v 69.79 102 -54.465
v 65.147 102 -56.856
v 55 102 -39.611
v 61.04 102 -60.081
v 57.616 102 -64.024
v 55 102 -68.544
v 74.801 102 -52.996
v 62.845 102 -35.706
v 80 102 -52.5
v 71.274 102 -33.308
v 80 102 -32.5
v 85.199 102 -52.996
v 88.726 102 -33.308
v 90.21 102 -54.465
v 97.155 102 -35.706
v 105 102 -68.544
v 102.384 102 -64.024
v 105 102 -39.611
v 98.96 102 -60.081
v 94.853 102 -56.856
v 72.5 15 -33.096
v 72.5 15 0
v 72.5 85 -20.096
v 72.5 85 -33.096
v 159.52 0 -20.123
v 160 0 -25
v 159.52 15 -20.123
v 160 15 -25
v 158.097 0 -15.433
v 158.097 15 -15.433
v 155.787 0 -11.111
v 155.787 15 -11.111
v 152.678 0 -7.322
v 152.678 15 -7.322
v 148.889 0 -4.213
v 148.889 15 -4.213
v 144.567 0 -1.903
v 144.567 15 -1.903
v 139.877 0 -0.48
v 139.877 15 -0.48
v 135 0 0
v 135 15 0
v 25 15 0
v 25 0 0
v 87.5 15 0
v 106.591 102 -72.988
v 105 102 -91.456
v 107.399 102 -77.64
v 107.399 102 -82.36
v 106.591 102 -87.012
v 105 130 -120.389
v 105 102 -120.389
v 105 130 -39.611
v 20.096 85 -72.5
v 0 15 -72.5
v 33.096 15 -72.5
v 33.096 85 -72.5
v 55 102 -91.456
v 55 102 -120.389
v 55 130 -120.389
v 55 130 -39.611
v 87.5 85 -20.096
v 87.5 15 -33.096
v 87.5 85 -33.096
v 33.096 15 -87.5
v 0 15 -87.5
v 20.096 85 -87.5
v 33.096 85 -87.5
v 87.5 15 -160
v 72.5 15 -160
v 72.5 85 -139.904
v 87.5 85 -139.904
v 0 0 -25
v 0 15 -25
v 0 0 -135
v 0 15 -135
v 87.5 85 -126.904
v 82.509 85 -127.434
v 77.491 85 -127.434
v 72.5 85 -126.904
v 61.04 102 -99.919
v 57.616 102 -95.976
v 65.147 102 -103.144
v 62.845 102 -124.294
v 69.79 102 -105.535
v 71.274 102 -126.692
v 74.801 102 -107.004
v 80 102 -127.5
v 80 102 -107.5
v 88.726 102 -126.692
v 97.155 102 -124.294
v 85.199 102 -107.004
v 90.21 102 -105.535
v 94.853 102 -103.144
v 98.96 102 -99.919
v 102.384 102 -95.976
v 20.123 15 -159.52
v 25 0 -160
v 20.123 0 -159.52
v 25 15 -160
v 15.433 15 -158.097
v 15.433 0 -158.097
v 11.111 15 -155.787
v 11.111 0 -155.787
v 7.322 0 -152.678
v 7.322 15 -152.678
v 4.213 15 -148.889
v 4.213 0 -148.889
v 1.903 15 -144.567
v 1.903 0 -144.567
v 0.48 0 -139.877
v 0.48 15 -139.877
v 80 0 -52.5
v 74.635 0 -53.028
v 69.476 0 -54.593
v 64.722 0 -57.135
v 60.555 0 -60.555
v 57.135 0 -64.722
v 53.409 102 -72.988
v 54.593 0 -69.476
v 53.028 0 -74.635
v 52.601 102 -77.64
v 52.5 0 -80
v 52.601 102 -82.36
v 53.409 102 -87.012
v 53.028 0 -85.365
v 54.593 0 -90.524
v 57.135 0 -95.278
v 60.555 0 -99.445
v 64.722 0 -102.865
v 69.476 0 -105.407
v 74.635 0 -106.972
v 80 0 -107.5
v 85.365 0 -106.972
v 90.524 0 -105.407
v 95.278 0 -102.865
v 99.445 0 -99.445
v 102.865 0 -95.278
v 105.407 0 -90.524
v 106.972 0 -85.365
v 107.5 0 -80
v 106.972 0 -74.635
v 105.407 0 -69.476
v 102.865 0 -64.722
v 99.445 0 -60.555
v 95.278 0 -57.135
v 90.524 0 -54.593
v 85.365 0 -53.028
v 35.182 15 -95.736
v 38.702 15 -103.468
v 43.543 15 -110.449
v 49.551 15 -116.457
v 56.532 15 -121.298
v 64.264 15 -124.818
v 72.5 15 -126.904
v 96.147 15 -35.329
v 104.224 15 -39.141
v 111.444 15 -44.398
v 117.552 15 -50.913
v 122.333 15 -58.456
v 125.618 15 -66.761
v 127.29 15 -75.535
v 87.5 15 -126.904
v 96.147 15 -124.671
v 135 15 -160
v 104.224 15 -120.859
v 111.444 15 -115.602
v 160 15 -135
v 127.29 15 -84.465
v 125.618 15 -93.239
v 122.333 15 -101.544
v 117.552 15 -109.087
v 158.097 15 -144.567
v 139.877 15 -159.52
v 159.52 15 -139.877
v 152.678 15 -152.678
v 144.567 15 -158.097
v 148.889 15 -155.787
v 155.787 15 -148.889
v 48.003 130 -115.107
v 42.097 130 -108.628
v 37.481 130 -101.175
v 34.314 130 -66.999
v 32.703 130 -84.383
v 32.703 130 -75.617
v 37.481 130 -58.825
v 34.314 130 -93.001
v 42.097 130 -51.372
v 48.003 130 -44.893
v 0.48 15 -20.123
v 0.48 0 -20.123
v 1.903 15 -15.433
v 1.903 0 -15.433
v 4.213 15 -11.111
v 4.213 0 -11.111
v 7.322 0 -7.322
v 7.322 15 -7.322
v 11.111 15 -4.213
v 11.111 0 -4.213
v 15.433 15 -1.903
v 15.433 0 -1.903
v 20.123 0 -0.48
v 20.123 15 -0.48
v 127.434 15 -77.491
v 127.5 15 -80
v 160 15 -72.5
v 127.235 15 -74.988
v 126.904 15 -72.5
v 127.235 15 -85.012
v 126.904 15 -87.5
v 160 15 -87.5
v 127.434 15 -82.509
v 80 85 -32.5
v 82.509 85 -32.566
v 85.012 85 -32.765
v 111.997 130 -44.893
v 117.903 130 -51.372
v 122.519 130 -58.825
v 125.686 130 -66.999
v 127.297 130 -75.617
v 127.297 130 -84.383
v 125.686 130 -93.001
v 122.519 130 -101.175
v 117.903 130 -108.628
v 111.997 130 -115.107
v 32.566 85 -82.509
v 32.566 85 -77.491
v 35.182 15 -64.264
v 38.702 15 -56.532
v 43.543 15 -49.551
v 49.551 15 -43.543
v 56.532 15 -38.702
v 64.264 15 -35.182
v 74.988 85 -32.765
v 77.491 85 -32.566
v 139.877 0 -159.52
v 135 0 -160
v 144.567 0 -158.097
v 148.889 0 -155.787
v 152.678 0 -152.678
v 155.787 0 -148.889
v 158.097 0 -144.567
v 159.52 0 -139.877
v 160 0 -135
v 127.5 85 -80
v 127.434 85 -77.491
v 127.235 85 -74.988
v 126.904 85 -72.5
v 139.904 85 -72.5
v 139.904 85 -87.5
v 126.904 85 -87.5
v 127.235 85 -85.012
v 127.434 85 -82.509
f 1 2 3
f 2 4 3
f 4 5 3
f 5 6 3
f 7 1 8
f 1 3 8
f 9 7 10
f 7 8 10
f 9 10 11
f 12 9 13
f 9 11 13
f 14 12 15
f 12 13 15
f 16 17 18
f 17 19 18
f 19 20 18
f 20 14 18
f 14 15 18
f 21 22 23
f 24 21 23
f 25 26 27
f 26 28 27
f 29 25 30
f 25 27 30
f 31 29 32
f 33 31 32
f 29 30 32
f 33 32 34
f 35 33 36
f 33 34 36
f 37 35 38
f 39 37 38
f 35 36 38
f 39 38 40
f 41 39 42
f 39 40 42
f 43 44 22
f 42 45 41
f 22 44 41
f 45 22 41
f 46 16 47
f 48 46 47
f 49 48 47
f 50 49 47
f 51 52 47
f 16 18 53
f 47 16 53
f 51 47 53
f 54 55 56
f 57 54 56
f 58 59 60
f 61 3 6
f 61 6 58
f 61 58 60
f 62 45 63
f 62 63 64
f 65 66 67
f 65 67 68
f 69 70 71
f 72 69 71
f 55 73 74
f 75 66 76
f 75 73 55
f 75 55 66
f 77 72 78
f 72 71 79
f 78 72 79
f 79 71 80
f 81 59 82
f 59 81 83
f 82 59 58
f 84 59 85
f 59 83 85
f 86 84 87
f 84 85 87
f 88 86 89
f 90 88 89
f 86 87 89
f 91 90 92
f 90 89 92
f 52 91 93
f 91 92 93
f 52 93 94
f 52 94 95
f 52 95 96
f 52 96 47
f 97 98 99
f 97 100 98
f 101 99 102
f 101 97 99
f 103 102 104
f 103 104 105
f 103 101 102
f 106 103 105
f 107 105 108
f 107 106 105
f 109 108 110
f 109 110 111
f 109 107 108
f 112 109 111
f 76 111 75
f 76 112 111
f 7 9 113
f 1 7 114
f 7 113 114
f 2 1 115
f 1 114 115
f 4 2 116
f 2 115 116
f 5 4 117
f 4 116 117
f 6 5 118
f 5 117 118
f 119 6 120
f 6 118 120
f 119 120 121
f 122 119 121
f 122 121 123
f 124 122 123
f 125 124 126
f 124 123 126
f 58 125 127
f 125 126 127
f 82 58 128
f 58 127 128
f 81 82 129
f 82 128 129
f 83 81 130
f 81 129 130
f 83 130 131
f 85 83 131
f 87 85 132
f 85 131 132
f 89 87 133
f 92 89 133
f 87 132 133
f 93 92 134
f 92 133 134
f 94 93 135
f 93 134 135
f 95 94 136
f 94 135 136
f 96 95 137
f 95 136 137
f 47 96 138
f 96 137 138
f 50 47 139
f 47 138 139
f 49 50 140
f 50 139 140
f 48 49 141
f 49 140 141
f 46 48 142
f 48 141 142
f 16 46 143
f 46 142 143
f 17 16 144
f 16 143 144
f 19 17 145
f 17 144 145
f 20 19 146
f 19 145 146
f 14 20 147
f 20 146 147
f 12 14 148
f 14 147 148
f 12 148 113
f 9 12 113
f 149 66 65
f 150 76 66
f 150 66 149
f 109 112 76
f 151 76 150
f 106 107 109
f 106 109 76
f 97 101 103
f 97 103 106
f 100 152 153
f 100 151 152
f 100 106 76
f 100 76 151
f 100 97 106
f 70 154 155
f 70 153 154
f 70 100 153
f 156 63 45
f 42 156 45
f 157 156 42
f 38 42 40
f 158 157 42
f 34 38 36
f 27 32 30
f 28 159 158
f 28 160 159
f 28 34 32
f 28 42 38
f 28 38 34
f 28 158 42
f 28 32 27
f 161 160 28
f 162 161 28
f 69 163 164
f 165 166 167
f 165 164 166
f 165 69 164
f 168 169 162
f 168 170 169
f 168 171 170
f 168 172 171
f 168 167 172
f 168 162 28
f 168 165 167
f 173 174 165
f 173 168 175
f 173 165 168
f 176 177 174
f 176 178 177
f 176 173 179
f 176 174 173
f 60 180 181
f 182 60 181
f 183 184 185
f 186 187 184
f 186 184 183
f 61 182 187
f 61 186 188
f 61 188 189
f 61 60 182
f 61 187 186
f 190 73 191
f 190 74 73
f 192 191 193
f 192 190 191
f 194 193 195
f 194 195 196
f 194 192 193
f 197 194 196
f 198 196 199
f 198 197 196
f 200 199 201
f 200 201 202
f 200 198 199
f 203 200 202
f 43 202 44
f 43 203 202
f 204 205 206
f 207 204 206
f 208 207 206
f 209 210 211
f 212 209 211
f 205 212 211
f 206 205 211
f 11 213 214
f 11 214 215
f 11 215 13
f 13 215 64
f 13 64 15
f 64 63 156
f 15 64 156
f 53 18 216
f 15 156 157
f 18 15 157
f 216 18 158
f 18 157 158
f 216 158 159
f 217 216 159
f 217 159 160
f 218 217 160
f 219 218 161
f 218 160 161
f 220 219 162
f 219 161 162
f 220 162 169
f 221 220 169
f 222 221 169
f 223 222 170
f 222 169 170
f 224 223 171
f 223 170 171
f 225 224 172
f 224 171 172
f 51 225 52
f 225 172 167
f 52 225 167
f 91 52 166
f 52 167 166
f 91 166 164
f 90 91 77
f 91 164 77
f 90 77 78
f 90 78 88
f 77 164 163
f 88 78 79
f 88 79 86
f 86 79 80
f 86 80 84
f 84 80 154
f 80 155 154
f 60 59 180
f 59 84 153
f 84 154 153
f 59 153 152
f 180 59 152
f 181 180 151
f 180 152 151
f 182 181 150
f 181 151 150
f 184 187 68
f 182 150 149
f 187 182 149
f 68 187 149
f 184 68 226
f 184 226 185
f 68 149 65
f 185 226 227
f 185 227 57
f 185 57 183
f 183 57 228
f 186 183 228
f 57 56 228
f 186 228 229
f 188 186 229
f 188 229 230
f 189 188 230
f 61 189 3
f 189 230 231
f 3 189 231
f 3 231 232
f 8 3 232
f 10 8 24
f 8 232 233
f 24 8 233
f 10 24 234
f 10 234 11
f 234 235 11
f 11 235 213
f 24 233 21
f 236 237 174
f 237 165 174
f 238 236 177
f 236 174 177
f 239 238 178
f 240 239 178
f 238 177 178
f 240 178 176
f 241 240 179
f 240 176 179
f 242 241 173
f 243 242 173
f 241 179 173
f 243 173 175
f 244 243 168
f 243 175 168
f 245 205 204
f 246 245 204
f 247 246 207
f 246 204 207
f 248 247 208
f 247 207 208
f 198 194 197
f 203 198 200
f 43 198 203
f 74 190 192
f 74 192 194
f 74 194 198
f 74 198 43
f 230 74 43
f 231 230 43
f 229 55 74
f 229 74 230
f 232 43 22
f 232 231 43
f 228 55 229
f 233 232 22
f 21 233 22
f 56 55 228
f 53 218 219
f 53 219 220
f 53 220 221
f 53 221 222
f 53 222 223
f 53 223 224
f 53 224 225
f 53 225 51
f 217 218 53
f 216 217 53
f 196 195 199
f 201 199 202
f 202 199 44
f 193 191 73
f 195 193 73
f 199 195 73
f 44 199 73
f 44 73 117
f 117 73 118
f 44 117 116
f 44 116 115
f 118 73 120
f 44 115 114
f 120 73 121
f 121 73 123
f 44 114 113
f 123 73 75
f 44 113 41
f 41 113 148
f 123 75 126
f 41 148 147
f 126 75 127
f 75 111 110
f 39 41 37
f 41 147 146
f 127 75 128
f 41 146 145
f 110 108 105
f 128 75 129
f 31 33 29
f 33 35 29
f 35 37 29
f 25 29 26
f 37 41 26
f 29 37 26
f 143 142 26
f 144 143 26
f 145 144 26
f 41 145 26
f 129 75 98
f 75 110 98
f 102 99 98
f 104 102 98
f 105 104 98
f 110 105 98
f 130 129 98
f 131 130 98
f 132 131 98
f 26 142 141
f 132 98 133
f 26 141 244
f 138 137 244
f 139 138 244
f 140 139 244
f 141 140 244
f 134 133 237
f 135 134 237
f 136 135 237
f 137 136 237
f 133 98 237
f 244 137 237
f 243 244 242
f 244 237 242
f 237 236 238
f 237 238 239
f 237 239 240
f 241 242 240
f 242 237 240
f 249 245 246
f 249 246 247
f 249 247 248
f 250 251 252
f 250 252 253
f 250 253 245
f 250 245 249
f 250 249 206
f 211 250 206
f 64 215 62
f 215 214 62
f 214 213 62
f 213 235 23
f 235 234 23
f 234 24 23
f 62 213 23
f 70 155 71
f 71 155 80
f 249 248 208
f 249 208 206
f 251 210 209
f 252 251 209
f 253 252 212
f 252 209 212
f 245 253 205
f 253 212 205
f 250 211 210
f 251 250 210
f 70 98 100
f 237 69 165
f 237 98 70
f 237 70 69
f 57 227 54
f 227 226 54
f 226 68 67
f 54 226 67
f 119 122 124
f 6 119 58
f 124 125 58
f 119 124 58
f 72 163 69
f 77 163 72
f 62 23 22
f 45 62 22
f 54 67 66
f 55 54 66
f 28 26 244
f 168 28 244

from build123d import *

# Parameters (mm, degrees)
SKETCH1_W           = 160
SKETCH1_H           = 160
BOSS_EXTRUDE1_DEPTH = 15
SKETCH2_R           = 47.5
BOSS_EXTRUDE2_DEPTH = 115
BOSS_EXTRUDE3_DEPTH = 70
CUT_EXTRUDE1_DEPTH  = 15
CIRPATTERN1_START   = -87.5
CIRPATTERN1_DEPTH   = 15
CIRPATTERN1_START_2 = 72.5
CIRPATTERN1_2_DEPTH = 15
SKETCH4_W           = 50
SKETCH4_H           = 28
CUT_EXTRUDE2_DEPTH  = 261.959767014
SKETCH5_W           = 27.5
SKETCH5_H           = 102.001
FILLET1_R           = 25


# Read off the part's stored shape, not the designer's step: CirPattern1
with BuildPart() as part:
    # Sketch1 → Boss-Extrude1 (new body)
    with BuildSketch(Plane(origin=(0, 0, 0), x_dir=(1, 0, 0), z_dir=(0, 1, 0))):
        with Locations((80, 80)):
            Rectangle(SKETCH1_W, SKETCH1_H)
    extrude(amount=BOSS_EXTRUDE1_DEPTH)

    # Sketch2 → Boss-Extrude2 (add)
    with BuildSketch(Plane(origin=(0, 15, 0), x_dir=(1, 0, 0), z_dir=(0, 1, 0))):
        with Locations(Location((80, 80, 0), (0, 0, 270))):
            Circle(SKETCH2_R)
    extrude(amount=BOSS_EXTRUDE2_DEPTH)

    # CirPattern1 outline → CirPattern1 (add)
    with BuildSketch(Plane.XY.offset(CIRPATTERN1_START)):
        Polygon((82, 85), (20.095842402, 85), (0, 15), (82, 15), align=None)
    extrude(amount=CIRPATTERN1_DEPTH)

    # CirPattern1 2 outline → CirPattern1 2 (add)
    with BuildSketch(Plane.YZ.offset(CIRPATTERN1_START_2)):
        Polygon((15, -160), (85, -139.904157598), (85, -20.095842402), (15, 0), align=None)
    extrude(amount=CIRPATTERN1_2_DEPTH)

    # Sketch4 → Cut-Extrude2 (cut, through all)
    with BuildSketch(Plane.XY):
        with Locations((80, 116)):
            Rectangle(SKETCH4_W, SKETCH4_H)
    extrude(amount=-CUT_EXTRUDE2_DEPTH, mode=Mode.SUBTRACT)

    # Sketch5 → Ø12.0 (55) Diameter Hole1 (revolve, cut)
    with BuildSketch(Plane(origin=(80, 102, -80), x_dir=(0, 0, 1), z_dir=(1, 0, 0))):
        with Locations((13.75, 51.0005)):
            Rectangle(SKETCH5_W, SKETCH5_H)
    revolve(axis=Axis((80, 108.35, -80), (0, -1, 0)), mode=Mode.SUBTRACT)

    # Fillet1
    fillet1_edges = [part.edges().sort_by_distance(p)[0] for p in [
        (0, 7.5, 0),
        (0, 7.5, -160),
        (160, 7.5, -160),
        (160, 7.5, 0),
    ]]
    fillet(fillet1_edges, radius=FILLET1_R)


with BuildPart() as body_2:
    # Sketch2<5> → Boss-Extrude3 (new body)
    with BuildSketch(Plane(origin=(0, 15, 0), x_dir=(1, 0, 0), z_dir=(0, 1, 0))):
        with BuildLine():
            Line((126.904157598, 72.5), (160, 72.5))
            Line((160, 72.5), (160, 87.5))
            Line((160, 87.5), (126.904157598, 87.5))
            ThreePointArc((126.904157598, 87.5), (127.350805093, 83.761815658), (127.5, 80))
            ThreePointArc((127.5, 80), (127.350805093, 76.238184342), (126.904157598, 72.5))
        make_face()
    extrude(amount=BOSS_EXTRUDE3_DEPTH)

    # Sketch3 → Cut-Extrude1 (cut)
    with BuildSketch(Plane.XY.offset(-72.5)):
        Polygon((139.904157598, 85), (160, 15), (160, 85), align=None)
    extrude(amount=-CUT_EXTRUDE1_DEPTH, mode=Mode.SUBTRACT)


solid = Compound([part.part, body_2.part])
